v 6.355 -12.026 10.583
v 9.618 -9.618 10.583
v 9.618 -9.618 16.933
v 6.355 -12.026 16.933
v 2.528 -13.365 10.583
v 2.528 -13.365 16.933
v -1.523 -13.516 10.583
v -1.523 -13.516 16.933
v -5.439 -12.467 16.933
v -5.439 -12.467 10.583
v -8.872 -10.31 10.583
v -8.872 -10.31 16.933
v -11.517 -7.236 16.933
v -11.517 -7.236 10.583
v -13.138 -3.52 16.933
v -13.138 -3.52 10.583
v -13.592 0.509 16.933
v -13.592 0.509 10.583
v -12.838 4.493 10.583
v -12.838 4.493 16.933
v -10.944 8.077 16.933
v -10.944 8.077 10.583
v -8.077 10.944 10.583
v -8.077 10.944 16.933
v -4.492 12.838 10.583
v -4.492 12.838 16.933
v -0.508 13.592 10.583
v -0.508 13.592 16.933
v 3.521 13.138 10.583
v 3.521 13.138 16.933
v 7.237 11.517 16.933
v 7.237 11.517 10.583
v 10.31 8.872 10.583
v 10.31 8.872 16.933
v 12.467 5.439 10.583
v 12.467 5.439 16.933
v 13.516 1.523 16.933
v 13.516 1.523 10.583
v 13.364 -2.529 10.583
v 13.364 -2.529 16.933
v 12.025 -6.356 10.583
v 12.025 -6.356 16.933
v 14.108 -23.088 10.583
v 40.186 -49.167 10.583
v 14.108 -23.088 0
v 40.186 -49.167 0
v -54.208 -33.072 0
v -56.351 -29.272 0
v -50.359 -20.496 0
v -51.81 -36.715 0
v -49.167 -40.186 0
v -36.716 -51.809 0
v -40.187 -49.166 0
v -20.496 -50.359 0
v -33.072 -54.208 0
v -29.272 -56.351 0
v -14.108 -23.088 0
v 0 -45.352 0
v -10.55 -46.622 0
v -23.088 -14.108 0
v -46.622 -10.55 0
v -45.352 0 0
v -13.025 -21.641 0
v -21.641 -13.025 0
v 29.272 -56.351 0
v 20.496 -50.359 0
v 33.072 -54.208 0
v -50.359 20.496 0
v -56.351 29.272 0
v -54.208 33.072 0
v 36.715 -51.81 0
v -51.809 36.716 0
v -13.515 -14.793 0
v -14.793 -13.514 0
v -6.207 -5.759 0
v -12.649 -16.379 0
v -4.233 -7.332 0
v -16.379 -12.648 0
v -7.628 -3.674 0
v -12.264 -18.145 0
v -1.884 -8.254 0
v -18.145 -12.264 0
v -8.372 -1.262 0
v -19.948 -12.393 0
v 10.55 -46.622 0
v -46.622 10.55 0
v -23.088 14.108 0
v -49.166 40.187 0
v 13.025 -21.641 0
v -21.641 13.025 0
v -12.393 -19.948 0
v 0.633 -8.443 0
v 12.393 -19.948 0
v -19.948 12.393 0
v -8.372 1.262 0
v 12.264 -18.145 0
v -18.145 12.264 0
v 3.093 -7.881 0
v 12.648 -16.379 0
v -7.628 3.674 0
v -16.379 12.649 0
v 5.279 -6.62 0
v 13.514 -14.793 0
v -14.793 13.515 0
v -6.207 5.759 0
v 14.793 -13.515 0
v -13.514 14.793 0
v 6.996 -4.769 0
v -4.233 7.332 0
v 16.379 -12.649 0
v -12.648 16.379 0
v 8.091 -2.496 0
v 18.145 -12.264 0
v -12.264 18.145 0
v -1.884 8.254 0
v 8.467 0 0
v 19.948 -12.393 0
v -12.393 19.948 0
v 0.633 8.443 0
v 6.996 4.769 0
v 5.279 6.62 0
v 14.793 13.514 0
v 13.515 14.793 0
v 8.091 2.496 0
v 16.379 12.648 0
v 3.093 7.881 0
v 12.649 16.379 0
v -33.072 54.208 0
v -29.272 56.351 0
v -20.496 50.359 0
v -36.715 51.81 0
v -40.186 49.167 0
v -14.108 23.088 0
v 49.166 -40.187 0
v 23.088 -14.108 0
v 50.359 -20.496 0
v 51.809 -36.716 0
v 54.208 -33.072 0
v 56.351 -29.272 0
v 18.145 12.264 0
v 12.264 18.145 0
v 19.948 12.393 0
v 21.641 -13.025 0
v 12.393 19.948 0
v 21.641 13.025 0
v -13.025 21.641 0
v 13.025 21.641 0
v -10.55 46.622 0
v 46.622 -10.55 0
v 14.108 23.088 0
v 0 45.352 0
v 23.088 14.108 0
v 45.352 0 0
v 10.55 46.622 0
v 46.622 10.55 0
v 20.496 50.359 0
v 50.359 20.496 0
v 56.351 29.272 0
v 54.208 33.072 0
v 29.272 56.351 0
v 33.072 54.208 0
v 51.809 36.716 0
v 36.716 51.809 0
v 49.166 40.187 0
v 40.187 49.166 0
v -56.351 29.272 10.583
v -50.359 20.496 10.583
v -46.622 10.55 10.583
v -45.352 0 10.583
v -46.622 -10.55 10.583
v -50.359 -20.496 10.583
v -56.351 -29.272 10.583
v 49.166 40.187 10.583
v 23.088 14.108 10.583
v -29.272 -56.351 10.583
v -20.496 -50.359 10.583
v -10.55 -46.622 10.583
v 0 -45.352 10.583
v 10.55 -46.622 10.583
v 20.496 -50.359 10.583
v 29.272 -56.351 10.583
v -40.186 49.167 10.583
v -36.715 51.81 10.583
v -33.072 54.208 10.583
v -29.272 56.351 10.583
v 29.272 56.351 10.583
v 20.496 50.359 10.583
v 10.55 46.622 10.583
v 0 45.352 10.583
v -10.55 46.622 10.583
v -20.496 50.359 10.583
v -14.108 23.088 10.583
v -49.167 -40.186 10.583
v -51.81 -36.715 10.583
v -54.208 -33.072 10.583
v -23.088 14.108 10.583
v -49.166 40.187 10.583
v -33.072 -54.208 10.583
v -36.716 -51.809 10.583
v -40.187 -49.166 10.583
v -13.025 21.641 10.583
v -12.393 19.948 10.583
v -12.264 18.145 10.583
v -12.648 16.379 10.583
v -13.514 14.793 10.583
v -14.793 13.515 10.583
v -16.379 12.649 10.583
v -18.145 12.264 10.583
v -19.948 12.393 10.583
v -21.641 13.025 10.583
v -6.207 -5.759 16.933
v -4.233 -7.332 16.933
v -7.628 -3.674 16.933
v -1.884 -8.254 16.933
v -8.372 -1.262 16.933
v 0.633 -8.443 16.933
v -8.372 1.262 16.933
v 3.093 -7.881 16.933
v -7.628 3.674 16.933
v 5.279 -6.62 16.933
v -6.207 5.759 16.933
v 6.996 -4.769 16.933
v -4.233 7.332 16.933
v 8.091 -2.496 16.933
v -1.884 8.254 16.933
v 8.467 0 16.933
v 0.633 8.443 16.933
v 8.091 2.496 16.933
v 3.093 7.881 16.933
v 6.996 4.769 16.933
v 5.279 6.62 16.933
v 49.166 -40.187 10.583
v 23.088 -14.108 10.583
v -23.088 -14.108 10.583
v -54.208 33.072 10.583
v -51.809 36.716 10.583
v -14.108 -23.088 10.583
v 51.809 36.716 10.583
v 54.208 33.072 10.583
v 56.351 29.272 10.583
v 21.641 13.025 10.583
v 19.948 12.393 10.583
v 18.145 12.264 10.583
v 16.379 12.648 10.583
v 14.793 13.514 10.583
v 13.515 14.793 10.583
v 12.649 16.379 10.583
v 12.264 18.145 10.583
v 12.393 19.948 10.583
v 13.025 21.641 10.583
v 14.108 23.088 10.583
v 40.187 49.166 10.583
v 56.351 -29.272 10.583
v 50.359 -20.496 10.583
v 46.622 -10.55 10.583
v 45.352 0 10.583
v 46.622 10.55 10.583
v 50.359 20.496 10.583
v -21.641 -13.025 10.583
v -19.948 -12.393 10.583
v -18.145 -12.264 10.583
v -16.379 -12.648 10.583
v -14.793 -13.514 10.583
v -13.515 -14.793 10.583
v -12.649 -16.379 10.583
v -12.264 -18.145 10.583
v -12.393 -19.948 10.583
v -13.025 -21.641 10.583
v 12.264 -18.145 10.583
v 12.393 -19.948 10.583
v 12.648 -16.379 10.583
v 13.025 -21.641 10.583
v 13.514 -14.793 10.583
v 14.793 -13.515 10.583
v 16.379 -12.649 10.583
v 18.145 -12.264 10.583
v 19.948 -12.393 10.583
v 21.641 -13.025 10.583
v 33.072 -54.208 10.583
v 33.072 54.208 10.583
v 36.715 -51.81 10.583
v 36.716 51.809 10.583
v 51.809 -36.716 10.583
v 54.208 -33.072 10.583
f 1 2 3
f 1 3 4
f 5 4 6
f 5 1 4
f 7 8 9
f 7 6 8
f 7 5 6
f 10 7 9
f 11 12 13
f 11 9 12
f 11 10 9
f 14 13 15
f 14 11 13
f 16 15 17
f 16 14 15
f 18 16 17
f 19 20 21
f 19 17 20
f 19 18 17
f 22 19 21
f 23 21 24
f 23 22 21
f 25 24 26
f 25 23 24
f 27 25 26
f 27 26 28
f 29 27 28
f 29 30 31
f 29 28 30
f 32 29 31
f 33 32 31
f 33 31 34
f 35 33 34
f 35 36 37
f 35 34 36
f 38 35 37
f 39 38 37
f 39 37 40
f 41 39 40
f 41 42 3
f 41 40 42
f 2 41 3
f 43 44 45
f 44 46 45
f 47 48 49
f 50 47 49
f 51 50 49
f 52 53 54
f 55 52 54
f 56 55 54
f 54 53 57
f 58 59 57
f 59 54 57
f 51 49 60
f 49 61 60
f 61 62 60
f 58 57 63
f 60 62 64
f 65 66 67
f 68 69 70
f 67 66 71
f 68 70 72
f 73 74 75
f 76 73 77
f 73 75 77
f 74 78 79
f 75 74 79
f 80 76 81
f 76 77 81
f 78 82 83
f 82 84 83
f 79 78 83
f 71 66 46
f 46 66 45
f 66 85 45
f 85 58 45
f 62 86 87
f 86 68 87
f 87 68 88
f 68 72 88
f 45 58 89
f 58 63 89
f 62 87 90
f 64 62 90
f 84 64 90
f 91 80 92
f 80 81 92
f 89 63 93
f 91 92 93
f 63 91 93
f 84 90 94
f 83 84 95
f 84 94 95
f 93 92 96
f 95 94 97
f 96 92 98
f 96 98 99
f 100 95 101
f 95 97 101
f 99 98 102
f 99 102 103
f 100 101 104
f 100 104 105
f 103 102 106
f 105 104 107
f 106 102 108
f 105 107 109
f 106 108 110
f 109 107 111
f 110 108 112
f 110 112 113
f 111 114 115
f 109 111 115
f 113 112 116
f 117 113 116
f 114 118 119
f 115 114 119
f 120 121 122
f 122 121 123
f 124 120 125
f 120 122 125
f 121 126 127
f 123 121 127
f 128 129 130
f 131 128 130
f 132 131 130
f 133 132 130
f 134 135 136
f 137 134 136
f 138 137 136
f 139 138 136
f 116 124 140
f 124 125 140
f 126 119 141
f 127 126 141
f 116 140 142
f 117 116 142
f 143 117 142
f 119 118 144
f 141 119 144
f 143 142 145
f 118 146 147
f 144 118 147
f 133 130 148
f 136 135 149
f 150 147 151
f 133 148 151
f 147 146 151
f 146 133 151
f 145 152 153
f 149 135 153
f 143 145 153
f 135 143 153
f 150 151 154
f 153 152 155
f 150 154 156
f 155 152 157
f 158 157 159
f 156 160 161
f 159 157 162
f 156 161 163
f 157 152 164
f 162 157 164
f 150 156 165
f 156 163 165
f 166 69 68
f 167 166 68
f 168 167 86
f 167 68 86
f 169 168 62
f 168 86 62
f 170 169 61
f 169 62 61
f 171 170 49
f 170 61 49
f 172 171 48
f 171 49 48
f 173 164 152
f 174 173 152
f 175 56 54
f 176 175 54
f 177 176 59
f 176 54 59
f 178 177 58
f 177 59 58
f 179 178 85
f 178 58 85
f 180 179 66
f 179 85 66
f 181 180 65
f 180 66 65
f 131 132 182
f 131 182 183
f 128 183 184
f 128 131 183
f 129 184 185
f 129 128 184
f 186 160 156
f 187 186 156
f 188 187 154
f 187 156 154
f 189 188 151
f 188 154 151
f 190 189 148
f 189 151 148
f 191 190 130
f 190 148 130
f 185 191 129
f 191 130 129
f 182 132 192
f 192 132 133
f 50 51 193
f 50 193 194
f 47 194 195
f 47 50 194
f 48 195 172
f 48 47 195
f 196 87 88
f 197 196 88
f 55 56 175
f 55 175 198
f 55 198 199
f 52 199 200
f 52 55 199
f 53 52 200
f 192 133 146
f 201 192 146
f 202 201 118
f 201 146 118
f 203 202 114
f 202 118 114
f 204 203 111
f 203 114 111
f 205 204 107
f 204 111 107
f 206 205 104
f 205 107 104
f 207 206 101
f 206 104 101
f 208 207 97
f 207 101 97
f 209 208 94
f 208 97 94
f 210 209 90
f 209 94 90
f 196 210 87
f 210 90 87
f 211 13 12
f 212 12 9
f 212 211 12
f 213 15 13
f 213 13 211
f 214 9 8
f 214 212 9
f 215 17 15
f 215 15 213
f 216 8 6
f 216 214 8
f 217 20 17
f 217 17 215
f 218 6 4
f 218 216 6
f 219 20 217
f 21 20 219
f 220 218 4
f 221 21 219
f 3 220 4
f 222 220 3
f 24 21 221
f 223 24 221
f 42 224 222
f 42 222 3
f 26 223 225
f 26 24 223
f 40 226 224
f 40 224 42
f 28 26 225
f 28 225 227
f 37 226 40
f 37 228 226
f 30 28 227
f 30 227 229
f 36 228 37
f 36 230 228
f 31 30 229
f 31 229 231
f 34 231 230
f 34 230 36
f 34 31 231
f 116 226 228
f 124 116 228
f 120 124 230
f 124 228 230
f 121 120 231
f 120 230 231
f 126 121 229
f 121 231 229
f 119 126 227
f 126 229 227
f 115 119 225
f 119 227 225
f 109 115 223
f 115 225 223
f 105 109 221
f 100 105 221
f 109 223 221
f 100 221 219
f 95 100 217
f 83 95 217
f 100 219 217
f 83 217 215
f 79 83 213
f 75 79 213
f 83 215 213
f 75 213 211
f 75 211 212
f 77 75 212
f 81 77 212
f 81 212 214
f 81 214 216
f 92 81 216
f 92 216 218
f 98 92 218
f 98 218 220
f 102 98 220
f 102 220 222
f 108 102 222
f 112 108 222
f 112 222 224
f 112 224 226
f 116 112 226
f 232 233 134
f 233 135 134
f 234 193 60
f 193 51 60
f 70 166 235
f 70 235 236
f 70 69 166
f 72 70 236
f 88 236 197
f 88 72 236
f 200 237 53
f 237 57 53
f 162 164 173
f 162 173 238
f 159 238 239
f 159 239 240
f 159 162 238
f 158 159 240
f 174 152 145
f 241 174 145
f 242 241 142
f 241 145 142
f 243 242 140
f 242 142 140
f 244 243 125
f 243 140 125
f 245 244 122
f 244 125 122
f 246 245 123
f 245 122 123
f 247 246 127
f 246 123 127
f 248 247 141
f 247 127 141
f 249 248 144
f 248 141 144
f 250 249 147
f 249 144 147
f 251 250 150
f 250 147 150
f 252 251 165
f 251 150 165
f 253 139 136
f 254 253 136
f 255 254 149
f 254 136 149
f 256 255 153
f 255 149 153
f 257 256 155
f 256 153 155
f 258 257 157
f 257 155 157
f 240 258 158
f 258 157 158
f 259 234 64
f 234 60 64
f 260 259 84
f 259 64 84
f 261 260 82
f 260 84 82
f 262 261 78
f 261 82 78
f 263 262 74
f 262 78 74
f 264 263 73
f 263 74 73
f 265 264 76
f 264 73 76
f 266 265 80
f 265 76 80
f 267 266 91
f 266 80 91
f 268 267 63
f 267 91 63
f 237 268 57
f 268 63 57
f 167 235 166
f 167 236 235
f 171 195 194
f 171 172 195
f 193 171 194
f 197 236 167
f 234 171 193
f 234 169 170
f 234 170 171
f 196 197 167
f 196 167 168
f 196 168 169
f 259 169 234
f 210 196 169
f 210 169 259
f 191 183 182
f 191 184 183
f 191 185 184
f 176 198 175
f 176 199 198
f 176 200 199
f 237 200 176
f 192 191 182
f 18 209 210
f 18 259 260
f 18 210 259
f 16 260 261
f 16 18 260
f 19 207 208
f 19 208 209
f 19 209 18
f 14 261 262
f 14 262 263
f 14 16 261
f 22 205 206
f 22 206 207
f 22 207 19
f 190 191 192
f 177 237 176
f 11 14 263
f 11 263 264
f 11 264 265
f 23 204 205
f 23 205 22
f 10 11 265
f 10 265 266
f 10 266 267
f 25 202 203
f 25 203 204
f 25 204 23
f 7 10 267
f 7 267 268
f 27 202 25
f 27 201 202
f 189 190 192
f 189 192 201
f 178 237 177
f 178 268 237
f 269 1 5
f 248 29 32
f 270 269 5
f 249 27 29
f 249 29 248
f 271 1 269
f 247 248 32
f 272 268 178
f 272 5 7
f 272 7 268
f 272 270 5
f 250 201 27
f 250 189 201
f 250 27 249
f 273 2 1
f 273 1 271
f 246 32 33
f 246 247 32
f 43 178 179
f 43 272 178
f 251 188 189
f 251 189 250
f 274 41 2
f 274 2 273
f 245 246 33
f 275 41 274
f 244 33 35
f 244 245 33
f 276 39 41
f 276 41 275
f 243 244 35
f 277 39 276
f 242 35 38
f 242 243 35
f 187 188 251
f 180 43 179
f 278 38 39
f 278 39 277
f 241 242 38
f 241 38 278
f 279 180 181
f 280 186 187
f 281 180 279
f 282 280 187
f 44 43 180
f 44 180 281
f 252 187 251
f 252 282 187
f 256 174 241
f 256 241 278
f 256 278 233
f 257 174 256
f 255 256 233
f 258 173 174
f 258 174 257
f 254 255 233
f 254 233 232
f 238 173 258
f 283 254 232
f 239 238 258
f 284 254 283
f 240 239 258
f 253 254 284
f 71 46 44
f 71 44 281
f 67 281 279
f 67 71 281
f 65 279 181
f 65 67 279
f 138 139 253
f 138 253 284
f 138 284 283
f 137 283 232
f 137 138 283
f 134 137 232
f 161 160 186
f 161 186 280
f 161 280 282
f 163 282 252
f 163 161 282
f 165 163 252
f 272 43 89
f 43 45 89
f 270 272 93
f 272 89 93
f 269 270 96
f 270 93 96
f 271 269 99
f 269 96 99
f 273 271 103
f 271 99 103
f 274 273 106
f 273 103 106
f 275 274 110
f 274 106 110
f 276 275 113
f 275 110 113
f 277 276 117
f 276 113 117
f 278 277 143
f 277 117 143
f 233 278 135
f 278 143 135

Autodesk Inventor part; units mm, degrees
ref_plane "YZ Plane" through (0, 0, 0) normal (1, 0, 0) x (0, 1, 0)
ref_plane "XZ Plane" through (0, 0, 0) normal (0, 1, 0) x (-1, 0, 0)
ref_plane "XY Plane" through (0, 0, 0) normal (0, 0, 1) x (1, 0, 0)
sketch "Sketch4" plane through (0, 0, 0) normal (0, 0, 1) x (1, 0, 0)
  line L0 (0, 0) -> (44.9009, -44.9017) construction
  line L1 (44.9009, -44.9017) -> (89.8017, 0) construction
  line L2 (89.8017, 0) -> (0, 0) construction
  circle A0 centre (0, 0) radius 63.5 construction
  line L3 (40.1856, -49.1667) -> (14.1078, -23.0884)
  line L4 (23.0881, -14.1082) -> (49.166, -40.1866)
  arc A1 (23.0881, -14.1082) -> (14.1078, -23.0884) centre (18.5979, -18.5983) ccw
  arc A2 (56.3508, 29.2718) -> (56.3508, -29.2718) centre (89.8017, 0) ccw
  arc A3 (49.166, -40.1866) -> (56.3508, -29.2718) centre (0, 0) ccw
  arc A4 (56.3508, 29.2718) -> (49.166, 40.1866) centre (0, 0) ccw
  line L5 (49.166, 40.1866) -> (56.3508, 29.2718) construction
  line L6 (56.3508, -29.2718) -> (49.166, -40.1866) construction
  line L7 (0, 0) -> (44.9017, 44.9009) construction
  line L8 (44.9017, 44.9009) -> (0, 89.8017) construction
  line L9 (0, 89.8017) -> (0, 0) construction
  circle A5 centre (0, 0) radius 63.5 construction
  line L10 (49.166, 40.1866) -> (23.0884, 14.1078)
  line L11 (14.1082, 23.0881) -> (40.1866, 49.166)
  arc A6 (14.1082, 23.0881) -> (23.0884, 14.1078) centre (18.5983, 18.5979) ccw
  arc A7 (-29.2718, 56.3508) -> (29.2718, 56.3508) centre (0, 89.8017) ccw
  arc A8 (40.1866, 49.166) -> (29.2718, 56.3508) centre (0, 0) ccw
  arc A9 (-29.2718, 56.3508) -> (-40.1856, 49.1667) centre (0, 0) ccw
  line L12 (-40.1856, 49.1667) -> (-29.2718, 56.3508) construction
  line L13 (29.2718, 56.3508) -> (40.1866, 49.166) construction
  line L14 (0, 0) -> (-44.9008, 44.9017) construction
  line L15 (-44.9008, 44.9017) -> (-89.8017, 0) construction
  line L16 (-89.8017, 0) -> (0, 0) construction
  circle A10 centre (0, 0) radius 63.5 construction
  line L17 (-40.1856, 49.1667) -> (-14.1078, 23.0884)
  line L18 (-23.0881, 14.1082) -> (-49.166, 40.1866)
  arc A11 (-23.0881, 14.1082) -> (-14.1078, 23.0884) centre (-18.5979, 18.5983) ccw
  arc A12 (-56.3508, -29.2718) -> (-56.3508, 29.2718) centre (-89.8017, 0) ccw
  arc A13 (-49.166, 40.1866) -> (-56.3508, 29.2718) centre (0, 0) ccw
  arc A14 (-56.3508, -29.2718) -> (-49.1667, -40.1856) centre (0, 0) ccw
  line L19 (-49.1667, -40.1856) -> (-56.3508, -29.2718) construction
  line L20 (-56.3508, 29.2718) -> (-49.166, 40.1866) construction
  line L21 (0, 0) -> (-44.9017, -44.9008) construction
  line L22 (-44.9017, -44.9008) -> (0, -89.8017) construction
  line L23 (0, -89.8017) -> (0, 0) construction
  circle A15 centre (0, 0) radius 63.5 construction
  line L24 (-49.1667, -40.1856) -> (-23.0884, -14.1078)
  line L25 (-14.1082, -23.0881) -> (-40.1866, -49.166)
  arc A16 (-14.1082, -23.0881) -> (-23.0884, -14.1078) centre (-18.5983, -18.5979) ccw
  arc A17 (29.2718, -56.3508) -> (-29.2718, -56.3508) centre (0, -89.8017) ccw
  arc A18 (-40.1866, -49.166) -> (-29.2718, -56.3508) centre (0, 0) ccw
  arc A19 (29.2718, -56.3508) -> (40.1856, -49.1667) centre (0, 0) ccw
  line L26 (40.1856, -49.1667) -> (29.2718, -56.3508) construction
  line L27 (-29.2718, -56.3508) -> (-40.1866, -49.166) construction
  dimension "d22" = 89.8017
  dimension "d23" = 63.5
  dimension "d27" = 12.7
  dimension "d28" = 37.1983
  dimension "d29" = 44.45
extrude "Extrusion3" add sketch "Sketch4" along normal blind 16.9333
ref_plane "Work Plane1" through (0, 0, 8.4667) normal (0, 0, -1) x (-1, 0, 0)
sketch "Sketch19" plane through (0, 0, 16.9333) normal (0, 0, 1) x (1, 0, 0)
  circle A0 centre (0, 0) radius 8.4667
  dimension "d93" = 16.9333
extrude "Extrusion15" cut sketch "Sketch19" against normal through all
ref_plane "Work Plane5" through (14.1078, -14.1081, 0) normal (0.7071, 0.7071, 0) x (-0.7071, 0.7071, 0)
sketch "Sketch20" plane through (14.1078, -14.1081, 0) normal (0.7071, 0.7071, 0) x (-0.7071, 0.7071, 0)
  line L0 (-6.35, 0) -> (-6.35, 16.9333) projected
  line L1 (-6.35, 0) -> (-6.35, 16.9333)
  line L2 (-6.35, 16.9333) -> (-82.55, 16.9333)
  line L3 (-40.5924, 16.9333) -> (0.8046, 16.9333) projected
  line L4 (-82.55, 16.9333) -> (-82.55, 10.5833)
  line L5 (-6.35, 0) -> (-43.23, 0) projected
  line L6 (-82.55, 0) -> (-6.35, 0) construction
  line L7 (19.9517, 0) -> (19.9517, 76.2)
  line L8 (-6.35, 16.9333) -> (6.35, 16.9333)
  line L9 (6.35, 16.9333) -> (6.35, 0)
  line L10 (6.35, 0) -> (-6.35, 0)
  line L11 (-82.55, 16.9333) -> (-82.55, 10.5833)
  line L12 (-82.55, 10.5833) -> (-6.35, 10.5833)
  line L13 (-6.35, 10.5833) -> (6.35, 10.5833)
  line L14 (-82.55, 10.5833) -> (-82.55, 0) construction
  dimension "d96" = 76.2
  dimension "d97" = 76.2
  dimension "d98" = 12.7
  dimension "d99" = 6.35
revolve "Revolution3" cut sketch "Sketch20" angle 360 about axis through (0, 0, 0) along (0, 0, 1) contours L12 L4 L2 L0 | L0 L3 L8 L9 L13
properties part number "Geneva Driven" material "ABS Plastic"
